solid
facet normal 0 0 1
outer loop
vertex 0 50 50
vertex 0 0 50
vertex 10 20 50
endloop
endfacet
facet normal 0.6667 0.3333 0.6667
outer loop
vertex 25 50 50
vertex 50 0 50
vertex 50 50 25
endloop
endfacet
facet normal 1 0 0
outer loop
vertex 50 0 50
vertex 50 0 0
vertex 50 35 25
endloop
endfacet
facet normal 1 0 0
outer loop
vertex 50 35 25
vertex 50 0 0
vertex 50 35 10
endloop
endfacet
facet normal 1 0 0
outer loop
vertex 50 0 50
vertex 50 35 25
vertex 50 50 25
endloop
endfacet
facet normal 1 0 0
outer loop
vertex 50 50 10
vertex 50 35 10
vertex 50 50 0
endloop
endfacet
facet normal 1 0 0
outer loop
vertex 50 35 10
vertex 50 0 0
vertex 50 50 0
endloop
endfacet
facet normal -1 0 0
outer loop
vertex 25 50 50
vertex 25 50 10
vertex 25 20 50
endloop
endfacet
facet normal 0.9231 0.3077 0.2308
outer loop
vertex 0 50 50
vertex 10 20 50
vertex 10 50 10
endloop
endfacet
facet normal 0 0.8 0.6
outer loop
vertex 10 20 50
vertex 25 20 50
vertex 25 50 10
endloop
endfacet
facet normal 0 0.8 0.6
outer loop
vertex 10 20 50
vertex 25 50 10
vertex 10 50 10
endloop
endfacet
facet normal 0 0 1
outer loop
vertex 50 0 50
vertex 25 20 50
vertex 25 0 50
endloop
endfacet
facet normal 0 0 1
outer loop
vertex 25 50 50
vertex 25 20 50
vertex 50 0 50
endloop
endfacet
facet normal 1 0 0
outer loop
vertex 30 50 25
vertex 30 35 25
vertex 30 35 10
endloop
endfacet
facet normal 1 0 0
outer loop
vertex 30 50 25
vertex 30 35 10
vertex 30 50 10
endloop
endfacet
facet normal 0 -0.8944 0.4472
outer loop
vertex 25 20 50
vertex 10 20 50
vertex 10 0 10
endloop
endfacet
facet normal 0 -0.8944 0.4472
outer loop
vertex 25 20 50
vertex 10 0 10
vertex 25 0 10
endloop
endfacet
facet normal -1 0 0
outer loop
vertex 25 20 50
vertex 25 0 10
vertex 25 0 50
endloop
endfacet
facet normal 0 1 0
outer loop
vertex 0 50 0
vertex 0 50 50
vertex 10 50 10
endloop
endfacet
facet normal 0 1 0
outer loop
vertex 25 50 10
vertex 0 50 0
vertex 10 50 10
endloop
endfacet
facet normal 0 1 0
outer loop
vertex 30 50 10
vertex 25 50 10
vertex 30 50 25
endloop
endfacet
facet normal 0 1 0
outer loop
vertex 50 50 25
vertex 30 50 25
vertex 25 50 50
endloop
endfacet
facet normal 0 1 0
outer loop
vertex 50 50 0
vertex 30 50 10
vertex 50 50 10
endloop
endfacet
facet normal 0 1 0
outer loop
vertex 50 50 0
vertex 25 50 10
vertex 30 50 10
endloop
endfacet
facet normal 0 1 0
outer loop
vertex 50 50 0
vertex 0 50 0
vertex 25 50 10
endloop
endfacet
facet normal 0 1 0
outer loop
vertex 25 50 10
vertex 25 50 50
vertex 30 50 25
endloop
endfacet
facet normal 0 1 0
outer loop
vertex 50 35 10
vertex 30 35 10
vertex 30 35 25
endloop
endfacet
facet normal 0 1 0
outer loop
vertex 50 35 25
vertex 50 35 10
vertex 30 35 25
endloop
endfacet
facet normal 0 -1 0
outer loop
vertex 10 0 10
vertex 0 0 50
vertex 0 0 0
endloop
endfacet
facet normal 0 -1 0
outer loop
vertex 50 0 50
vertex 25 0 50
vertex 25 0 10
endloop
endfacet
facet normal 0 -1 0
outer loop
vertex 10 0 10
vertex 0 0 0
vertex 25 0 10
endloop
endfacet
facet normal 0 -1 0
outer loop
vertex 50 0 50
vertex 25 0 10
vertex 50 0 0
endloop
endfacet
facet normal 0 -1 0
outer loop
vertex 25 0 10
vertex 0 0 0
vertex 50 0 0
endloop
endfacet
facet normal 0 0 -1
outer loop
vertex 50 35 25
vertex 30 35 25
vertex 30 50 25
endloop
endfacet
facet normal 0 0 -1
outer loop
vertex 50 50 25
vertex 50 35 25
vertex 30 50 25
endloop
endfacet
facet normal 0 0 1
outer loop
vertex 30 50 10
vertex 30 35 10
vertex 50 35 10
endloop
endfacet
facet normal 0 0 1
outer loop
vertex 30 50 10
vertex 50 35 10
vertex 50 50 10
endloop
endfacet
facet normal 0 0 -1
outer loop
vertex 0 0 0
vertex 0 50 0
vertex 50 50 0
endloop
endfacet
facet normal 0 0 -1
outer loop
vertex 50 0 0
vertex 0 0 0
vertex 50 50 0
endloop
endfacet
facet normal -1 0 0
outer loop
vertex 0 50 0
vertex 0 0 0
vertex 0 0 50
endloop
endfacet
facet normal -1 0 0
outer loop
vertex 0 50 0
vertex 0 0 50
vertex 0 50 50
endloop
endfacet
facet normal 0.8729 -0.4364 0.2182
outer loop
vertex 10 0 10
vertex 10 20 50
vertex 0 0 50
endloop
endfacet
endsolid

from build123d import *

# Parameters (mm, degrees)
F0_W      = 50
F0_H      = 50
F1_DEPTH  = 50
F6_W      = 15
F6_H      = 53.66563146
F7_DEPTH  = 17.88954382
F11_W     = 15
F11_H     = 58
F12_DEPTH = 24.001
F17_DEPTH = 16.6676666667
F20_DEPTH = 8.7297156094
F23_DEPTH = 9.2317692308
F27_W     = 15
F27_H     = 15
F28_DEPTH = 20


with BuildPart() as f1:
    # F0 (on Top) → F1 (new body)
    with BuildSketch(Plane.XY):
        with Locations((25, 25)):
            Rectangle(F0_W, F0_H)
    extrude(amount=F1_DEPTH)

    # F6 (on 3pt) → F7 (cut, through all)
    with BuildSketch(Plane(origin=(0, -4, 2), x_dir=(1, 0, 0), z_dir=(0, -0.894427191, 0.4472135955))):
        with Locations((17.5, 26.83281573)):
            Rectangle(F6_W, F6_H)
    extrude(amount=F7_DEPTH, mode=Mode.SUBTRACT)

    # F11 (on 3pt) → F12 (cut, through all)
    with BuildSketch(Plane(origin=(0, 36.8, 27.6), x_dir=(-1, 0, 0), z_dir=(0, 0.8, 0.6))):
        with Locations((-17.5, -1)):
            Rectangle(F11_W, F11_H)
    extrude(amount=F12_DEPTH, mode=Mode.SUBTRACT)

    # F16 (on 3pt) → F17 (cut, through all)
    with BuildSketch(Plane(origin=(44.4444444444, 22.2222222222, 44.4444444444), x_dir=(-0.2357022604, 0.9428090416, -0.2357022604), z_dir=(0.6666666667, 0.3333333333, 0.6666666667))):
        Polygon((29.4627825494, 17.6776695297), (-23.5702260396, 0), (29.4627825494, -17.6776695297), align=None)
    extrude(amount=F17_DEPTH, mode=Mode.SUBTRACT)

    # F19 (on 3pt) → F20 (cut, through all)
    with BuildSketch(Plane(origin=(9.5238095238, -4.7619047619, 2.380952381), x_dir=(-0.4234048992, -0.8997354108, -0.1058512248), z_dir=(-0.8728715609, 0.4364357805, -0.2182178902))):
        Polygon((-5.2925612402, 7.2760687511), (-5.2925612402, 48.5071250073), (-27.5213184493, 46.0817687569), align=None)
    extrude(amount=-F20_DEPTH, mode=Mode.SUBTRACT)

    # F22 (on 3pt) → F23 (cut, through all)
    with BuildSketch(Plane(origin=(24.8520710059, 8.2840236686, 6.2130177515), x_dir=(-0.2985053847, 0.9514859136, -0.0746263462), z_dir=(0.9230769231, 0.3076923077, 0.2307692308))):
        Polygon((43.842978372, 48.5071250073), (12.3133471172, 46.0817687569), (43.842978372, 7.2760687511), align=None)
    extrude(amount=F23_DEPTH, mode=Mode.SUBTRACT)

    # F27 (on 3pt) → F28 (cut, through all)
    with BuildSketch(Plane.YZ.offset(30)):
        with Locations((42.5, 17.5)):
            Rectangle(F27_W, F27_H)
    extrude(amount=F28_DEPTH, mode=Mode.SUBTRACT)


solid = f1.part
